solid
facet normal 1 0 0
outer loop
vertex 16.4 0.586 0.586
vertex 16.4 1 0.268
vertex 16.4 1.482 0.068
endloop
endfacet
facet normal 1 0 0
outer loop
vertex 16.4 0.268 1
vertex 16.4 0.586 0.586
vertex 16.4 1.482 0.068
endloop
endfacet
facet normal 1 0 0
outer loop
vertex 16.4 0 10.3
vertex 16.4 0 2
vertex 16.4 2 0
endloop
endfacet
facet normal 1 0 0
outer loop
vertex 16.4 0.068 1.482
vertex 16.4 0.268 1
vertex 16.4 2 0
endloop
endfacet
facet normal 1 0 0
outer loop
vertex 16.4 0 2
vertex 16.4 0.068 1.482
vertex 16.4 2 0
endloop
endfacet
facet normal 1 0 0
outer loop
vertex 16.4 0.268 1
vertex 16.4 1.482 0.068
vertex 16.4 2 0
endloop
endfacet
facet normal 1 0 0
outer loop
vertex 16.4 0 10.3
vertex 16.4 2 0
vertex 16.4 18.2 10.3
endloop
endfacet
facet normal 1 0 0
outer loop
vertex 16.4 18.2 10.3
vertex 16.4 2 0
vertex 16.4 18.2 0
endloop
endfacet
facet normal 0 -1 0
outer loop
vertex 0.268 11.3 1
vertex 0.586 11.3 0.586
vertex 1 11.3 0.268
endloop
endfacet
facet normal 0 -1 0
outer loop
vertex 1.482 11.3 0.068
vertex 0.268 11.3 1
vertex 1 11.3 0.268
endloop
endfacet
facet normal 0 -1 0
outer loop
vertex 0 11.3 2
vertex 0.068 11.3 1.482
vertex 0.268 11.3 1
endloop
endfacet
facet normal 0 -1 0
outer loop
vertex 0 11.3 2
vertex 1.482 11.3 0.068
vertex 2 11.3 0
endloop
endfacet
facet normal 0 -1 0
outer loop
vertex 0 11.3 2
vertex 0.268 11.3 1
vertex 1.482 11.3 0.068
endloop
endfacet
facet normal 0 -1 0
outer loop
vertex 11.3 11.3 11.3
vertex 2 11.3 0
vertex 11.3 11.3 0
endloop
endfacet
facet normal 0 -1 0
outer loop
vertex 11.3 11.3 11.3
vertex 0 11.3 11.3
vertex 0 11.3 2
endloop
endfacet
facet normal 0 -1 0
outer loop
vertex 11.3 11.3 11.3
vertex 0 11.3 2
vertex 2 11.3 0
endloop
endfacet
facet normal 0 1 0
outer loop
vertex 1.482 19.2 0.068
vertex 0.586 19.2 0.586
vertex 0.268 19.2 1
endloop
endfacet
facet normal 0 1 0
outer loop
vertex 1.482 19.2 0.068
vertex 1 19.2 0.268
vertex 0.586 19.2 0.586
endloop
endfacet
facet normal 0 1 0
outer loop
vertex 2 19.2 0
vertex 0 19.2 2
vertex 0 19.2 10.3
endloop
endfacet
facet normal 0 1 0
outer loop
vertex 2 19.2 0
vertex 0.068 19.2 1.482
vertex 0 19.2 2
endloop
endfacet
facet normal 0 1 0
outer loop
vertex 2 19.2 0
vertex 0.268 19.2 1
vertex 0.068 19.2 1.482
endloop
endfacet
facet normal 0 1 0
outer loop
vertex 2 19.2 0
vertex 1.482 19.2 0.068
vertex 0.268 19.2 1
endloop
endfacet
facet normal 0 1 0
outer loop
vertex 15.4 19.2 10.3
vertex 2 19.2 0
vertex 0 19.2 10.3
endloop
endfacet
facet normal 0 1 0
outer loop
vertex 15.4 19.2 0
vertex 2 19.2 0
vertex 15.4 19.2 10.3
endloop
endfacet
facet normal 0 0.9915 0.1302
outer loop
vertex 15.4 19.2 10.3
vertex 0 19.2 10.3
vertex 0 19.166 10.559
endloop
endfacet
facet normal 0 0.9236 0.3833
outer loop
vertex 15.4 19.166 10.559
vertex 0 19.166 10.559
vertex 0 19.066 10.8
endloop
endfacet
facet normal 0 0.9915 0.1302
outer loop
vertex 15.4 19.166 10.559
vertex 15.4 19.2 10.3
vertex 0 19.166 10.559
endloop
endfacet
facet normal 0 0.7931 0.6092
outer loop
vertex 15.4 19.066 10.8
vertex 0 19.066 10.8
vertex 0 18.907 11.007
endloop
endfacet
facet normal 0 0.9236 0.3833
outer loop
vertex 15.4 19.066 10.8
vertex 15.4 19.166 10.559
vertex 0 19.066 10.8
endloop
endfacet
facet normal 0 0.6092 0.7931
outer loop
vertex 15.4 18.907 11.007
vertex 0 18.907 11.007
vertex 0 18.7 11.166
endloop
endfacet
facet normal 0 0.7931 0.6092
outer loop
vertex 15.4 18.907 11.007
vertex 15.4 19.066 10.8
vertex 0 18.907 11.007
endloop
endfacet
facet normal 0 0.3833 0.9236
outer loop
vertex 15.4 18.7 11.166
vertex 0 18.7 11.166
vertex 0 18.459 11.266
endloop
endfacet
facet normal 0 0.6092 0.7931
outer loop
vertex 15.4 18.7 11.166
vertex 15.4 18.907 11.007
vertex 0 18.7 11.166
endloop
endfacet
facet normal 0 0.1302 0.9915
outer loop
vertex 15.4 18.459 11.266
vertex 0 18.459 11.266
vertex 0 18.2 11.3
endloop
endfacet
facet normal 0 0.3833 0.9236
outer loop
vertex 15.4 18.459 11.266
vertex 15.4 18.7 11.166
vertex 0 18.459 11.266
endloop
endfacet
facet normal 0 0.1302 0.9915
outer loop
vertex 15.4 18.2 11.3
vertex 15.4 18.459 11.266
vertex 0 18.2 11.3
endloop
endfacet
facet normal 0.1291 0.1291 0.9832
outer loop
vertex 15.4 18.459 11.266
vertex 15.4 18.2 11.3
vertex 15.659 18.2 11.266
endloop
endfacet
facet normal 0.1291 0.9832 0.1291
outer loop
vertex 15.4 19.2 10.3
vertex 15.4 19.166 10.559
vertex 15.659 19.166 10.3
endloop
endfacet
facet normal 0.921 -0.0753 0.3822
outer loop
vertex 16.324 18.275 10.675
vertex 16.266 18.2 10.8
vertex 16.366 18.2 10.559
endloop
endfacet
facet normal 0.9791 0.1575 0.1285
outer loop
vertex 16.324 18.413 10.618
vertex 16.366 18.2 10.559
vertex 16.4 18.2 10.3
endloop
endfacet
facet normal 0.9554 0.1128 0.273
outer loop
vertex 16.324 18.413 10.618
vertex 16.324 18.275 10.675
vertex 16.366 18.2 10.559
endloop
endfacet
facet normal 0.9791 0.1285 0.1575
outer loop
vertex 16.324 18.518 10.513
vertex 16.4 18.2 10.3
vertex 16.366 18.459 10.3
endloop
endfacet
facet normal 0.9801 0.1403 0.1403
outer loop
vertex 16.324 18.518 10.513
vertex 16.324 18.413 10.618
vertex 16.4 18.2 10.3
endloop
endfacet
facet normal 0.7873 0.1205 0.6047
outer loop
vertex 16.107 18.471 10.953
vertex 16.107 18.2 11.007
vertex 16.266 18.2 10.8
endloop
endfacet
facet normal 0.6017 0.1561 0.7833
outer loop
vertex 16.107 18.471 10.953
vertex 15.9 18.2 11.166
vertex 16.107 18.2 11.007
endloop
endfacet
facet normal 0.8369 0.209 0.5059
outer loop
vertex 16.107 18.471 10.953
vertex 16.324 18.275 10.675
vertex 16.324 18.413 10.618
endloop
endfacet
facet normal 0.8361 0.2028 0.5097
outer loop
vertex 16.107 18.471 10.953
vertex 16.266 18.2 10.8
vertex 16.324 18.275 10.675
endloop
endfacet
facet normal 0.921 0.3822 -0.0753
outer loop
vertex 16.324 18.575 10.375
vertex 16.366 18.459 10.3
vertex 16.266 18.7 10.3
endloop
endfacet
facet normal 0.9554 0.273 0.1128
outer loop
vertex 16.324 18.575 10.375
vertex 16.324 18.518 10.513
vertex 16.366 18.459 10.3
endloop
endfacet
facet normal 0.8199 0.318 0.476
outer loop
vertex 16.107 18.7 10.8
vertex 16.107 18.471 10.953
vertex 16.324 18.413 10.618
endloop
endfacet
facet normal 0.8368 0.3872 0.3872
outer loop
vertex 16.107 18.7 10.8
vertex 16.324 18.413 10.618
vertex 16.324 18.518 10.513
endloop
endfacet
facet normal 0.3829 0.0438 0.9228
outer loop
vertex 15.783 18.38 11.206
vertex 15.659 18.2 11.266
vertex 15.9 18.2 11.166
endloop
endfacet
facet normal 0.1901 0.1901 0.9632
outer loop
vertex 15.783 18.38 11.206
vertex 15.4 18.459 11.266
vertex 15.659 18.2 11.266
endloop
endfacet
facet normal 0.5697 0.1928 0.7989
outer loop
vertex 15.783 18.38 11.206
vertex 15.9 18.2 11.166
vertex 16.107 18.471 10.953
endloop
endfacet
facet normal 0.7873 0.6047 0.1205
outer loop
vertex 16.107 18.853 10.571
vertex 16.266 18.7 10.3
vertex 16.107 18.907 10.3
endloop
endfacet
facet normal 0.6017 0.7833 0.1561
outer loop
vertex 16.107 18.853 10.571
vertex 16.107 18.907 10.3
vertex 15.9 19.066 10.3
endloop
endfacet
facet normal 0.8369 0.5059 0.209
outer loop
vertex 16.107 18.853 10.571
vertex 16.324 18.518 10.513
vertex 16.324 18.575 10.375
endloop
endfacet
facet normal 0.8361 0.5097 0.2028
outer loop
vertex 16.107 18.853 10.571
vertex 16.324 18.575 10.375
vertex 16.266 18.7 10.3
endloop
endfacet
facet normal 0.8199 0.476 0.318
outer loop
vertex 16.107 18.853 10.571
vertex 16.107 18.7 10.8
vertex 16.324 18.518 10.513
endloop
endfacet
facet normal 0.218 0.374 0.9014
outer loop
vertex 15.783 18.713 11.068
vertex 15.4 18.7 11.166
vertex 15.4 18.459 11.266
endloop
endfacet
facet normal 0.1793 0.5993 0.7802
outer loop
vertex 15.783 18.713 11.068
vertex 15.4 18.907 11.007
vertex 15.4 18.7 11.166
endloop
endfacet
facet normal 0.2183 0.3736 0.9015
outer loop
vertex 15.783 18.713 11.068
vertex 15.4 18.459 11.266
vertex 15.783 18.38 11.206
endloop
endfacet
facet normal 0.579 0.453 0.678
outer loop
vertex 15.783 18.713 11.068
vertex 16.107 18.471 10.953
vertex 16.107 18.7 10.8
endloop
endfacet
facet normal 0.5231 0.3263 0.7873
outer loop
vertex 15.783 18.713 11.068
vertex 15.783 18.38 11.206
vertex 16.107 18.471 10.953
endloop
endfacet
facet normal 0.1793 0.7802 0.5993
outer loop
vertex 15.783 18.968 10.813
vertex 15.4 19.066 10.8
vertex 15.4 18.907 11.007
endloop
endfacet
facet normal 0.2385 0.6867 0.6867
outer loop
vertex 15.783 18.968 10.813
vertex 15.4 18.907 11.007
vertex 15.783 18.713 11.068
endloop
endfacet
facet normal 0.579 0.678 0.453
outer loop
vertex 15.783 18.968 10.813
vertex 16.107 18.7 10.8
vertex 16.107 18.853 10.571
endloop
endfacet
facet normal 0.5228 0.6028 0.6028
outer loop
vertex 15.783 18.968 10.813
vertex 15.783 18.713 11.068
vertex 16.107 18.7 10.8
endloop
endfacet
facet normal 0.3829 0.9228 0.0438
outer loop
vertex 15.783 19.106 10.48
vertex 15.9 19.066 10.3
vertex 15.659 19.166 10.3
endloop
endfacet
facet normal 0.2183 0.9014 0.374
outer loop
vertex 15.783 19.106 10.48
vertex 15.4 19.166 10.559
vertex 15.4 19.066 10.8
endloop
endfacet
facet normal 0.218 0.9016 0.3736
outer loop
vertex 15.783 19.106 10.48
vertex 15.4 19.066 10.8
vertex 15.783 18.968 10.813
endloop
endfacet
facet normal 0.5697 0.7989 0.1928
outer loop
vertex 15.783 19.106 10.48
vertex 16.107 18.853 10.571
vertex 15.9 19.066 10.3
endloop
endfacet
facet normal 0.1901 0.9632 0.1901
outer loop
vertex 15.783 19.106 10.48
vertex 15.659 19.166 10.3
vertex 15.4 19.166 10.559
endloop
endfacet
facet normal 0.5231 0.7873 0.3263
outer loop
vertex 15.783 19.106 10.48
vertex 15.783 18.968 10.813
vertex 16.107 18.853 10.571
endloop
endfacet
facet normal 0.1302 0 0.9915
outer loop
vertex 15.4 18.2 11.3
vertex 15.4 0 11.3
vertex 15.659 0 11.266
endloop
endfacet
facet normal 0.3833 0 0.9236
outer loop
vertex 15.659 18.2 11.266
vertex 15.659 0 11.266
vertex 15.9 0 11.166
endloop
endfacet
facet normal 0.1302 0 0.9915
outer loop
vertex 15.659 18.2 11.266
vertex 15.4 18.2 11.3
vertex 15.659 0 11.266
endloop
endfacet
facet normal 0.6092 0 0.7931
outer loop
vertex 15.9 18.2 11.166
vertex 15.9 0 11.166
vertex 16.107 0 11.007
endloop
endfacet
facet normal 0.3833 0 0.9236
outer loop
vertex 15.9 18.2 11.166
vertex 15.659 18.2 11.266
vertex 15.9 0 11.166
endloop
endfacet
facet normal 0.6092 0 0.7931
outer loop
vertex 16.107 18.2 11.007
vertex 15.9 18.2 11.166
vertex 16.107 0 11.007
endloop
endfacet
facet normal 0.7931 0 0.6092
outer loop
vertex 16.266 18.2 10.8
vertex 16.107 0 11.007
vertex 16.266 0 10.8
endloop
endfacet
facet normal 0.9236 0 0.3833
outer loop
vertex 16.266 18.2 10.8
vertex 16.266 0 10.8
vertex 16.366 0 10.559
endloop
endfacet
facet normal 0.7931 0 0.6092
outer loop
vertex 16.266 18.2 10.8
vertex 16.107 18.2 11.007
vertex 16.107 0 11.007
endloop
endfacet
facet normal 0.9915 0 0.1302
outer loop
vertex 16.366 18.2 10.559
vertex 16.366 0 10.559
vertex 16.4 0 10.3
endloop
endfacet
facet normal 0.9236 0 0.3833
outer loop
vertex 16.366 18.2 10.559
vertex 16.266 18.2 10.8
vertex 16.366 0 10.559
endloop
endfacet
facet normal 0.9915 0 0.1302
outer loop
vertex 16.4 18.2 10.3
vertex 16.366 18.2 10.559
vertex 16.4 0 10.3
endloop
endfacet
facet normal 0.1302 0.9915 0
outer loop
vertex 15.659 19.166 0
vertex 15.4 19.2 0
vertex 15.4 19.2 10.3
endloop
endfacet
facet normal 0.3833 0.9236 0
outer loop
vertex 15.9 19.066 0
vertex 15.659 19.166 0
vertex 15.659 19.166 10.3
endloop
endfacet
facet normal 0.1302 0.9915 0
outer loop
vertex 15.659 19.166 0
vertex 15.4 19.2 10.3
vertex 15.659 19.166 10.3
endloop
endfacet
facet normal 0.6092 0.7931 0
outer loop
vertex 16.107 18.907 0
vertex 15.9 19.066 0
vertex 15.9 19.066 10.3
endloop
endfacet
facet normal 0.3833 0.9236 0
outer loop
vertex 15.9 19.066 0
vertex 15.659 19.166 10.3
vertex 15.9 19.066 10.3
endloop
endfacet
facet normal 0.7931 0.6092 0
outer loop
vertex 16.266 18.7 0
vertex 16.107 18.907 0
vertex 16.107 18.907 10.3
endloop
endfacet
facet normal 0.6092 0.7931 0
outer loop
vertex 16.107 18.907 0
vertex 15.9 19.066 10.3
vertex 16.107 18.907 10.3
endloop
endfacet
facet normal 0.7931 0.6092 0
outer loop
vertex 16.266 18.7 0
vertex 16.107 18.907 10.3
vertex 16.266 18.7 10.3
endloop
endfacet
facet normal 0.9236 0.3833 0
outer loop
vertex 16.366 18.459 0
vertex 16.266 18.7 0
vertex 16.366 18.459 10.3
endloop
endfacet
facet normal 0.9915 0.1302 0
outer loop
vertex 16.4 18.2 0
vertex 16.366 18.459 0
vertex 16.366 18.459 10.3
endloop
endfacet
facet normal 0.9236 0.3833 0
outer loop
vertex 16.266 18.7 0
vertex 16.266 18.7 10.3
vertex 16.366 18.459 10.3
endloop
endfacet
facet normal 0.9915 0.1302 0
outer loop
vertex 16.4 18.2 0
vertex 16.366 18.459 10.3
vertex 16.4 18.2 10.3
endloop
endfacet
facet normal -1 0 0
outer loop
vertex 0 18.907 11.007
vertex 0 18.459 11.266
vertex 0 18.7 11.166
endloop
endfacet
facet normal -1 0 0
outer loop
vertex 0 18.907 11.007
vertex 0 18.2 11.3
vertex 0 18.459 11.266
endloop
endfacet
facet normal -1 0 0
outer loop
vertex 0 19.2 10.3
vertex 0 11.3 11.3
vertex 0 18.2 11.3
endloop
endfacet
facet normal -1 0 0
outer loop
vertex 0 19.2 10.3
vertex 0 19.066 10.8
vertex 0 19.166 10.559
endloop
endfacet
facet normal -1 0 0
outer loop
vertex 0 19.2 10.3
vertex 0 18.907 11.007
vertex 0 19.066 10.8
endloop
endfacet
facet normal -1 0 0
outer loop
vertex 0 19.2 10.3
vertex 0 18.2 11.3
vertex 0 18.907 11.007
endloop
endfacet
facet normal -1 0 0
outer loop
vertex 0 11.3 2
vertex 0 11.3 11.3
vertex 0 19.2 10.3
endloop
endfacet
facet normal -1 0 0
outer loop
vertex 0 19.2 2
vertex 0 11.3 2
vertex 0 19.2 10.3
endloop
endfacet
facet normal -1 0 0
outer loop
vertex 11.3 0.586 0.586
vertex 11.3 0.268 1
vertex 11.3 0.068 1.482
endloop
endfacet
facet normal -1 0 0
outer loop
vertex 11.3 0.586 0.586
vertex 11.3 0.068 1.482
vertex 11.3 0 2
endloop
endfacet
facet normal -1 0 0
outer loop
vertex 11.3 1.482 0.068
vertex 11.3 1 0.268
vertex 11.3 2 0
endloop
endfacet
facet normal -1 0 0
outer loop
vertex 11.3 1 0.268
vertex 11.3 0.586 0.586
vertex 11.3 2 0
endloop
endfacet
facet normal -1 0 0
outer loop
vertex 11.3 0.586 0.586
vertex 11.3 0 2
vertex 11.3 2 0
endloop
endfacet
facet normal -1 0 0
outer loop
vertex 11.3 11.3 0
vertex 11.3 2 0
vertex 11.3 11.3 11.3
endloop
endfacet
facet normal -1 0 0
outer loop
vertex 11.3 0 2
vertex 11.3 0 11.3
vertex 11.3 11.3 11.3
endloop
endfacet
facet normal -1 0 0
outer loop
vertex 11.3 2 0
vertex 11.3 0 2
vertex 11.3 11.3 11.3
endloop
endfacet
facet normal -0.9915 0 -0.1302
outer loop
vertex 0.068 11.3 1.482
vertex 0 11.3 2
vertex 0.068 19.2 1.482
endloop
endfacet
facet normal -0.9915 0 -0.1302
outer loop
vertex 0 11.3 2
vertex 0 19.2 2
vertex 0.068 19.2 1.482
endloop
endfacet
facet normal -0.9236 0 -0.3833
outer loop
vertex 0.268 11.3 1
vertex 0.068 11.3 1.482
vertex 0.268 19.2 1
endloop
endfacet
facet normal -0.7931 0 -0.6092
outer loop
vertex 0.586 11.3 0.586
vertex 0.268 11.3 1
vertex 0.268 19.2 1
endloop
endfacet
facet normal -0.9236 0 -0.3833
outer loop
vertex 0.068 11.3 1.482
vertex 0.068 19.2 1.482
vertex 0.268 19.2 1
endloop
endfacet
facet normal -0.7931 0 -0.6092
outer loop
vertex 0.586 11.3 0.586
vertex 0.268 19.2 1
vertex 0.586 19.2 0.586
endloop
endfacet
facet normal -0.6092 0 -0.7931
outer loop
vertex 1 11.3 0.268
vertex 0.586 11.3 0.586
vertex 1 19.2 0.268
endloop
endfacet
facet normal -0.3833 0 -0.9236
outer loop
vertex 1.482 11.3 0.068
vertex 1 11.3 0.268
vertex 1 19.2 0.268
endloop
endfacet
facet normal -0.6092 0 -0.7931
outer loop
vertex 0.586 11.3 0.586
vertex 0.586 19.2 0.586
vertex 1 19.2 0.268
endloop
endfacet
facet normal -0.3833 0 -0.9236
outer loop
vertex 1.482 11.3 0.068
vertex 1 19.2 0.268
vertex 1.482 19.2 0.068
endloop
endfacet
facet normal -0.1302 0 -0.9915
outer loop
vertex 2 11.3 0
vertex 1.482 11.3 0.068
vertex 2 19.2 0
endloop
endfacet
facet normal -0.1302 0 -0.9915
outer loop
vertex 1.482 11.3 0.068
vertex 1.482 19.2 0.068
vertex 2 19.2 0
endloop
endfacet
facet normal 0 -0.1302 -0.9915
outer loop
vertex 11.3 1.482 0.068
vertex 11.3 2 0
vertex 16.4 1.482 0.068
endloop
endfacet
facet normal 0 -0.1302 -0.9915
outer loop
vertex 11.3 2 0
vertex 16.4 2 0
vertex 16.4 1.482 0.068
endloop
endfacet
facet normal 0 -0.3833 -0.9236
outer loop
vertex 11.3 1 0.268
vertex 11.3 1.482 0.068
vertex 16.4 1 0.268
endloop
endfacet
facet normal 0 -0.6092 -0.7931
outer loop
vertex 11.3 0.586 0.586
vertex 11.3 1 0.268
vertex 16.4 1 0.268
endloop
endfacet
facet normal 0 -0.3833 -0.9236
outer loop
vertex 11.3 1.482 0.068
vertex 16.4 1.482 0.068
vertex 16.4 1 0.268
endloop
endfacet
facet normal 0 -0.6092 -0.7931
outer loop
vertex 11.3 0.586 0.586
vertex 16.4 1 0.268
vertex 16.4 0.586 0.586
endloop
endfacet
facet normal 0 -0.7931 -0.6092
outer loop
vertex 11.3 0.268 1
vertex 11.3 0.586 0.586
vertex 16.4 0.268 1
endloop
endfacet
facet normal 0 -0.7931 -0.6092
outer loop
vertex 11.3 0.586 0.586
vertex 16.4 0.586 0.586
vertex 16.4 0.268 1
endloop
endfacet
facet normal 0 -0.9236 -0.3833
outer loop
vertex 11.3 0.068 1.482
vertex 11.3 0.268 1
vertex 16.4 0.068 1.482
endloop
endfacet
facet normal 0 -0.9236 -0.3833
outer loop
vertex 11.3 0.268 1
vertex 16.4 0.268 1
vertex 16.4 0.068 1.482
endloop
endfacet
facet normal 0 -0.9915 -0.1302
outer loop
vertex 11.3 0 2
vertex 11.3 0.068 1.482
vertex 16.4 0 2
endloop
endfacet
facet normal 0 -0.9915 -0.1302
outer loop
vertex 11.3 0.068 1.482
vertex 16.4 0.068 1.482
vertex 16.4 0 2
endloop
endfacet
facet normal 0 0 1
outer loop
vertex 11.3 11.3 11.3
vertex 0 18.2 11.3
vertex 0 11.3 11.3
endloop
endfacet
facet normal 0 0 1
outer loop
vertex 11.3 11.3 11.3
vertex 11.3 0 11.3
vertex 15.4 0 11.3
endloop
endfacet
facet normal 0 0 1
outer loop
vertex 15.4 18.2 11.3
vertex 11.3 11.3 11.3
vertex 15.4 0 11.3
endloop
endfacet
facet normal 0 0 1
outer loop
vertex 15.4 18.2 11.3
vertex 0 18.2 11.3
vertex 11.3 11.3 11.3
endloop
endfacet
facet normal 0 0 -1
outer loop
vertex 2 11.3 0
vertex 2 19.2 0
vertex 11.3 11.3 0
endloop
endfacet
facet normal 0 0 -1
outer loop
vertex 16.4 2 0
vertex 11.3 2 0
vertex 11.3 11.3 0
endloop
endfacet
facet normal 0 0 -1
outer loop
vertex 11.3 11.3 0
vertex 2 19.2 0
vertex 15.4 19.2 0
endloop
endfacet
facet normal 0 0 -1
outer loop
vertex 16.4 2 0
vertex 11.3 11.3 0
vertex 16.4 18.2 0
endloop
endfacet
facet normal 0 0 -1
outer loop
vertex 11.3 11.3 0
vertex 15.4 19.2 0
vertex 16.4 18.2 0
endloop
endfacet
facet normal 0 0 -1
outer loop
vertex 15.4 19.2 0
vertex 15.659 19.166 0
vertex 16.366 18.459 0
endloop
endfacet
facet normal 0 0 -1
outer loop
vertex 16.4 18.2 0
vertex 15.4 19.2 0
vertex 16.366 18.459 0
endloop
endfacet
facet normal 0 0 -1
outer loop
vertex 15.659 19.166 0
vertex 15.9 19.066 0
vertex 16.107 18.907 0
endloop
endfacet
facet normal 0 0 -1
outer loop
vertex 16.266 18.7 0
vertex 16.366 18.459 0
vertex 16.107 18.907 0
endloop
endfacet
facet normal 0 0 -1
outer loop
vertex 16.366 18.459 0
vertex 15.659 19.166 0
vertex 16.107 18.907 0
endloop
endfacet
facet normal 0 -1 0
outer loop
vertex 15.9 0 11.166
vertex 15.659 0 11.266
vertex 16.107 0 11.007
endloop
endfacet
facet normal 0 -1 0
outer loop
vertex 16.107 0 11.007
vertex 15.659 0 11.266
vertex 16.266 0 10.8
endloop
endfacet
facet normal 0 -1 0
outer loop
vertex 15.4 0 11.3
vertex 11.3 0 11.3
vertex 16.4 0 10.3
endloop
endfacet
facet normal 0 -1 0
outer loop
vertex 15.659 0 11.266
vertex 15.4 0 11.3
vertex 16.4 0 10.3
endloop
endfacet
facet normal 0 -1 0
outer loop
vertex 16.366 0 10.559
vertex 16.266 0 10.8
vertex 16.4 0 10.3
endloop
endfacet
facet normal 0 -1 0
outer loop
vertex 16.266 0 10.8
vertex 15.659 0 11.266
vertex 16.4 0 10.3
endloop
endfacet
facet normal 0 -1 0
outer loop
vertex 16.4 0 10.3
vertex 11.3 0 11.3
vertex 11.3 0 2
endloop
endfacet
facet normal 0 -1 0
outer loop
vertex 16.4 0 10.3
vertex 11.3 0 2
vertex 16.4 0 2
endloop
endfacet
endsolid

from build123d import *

# Parameters (mm, degrees)
F0_W     = 16.4
F0_H     = 19.2
F1_DEPTH = 11.3
F2_W     = 11.3
F2_H     = 11.3
F3_DEPTH = 25
F4_R     = 2
F5_R     = 1


with BuildPart() as f1:
    # F0 (on Top) → F1 (new body)
    with BuildSketch(Plane.XY):
        with Locations((8.2, 9.6)):
            Rectangle(F0_W, F0_H)
    extrude(amount=F1_DEPTH)

    # F2 (on face) → F3 (cut)
    with BuildSketch(Plane.XY.offset(11.3)):
        with Locations((5.65, 5.65)):
            Rectangle(F2_W, F2_H)
    extrude(amount=-F3_DEPTH, mode=Mode.SUBTRACT)

    # F4
    f4_edges = [f1.edges().sort_by_distance(p)[0] for p in [
        (13.85, 0, 0),
        (0, 15.25, 0),
    ]]
    fillet(f4_edges, radius=F4_R)

    # F5
    f5_edges = [f1.edges().sort_by_distance(p)[0] for p in [
        (8.2, 19.2, 11.3),
        (16.4, 9.6, 11.3),
        (16.4, 19.2, 5.65),
    ]]
    fillet(f5_edges, radius=F5_R)


solid = f1.part
